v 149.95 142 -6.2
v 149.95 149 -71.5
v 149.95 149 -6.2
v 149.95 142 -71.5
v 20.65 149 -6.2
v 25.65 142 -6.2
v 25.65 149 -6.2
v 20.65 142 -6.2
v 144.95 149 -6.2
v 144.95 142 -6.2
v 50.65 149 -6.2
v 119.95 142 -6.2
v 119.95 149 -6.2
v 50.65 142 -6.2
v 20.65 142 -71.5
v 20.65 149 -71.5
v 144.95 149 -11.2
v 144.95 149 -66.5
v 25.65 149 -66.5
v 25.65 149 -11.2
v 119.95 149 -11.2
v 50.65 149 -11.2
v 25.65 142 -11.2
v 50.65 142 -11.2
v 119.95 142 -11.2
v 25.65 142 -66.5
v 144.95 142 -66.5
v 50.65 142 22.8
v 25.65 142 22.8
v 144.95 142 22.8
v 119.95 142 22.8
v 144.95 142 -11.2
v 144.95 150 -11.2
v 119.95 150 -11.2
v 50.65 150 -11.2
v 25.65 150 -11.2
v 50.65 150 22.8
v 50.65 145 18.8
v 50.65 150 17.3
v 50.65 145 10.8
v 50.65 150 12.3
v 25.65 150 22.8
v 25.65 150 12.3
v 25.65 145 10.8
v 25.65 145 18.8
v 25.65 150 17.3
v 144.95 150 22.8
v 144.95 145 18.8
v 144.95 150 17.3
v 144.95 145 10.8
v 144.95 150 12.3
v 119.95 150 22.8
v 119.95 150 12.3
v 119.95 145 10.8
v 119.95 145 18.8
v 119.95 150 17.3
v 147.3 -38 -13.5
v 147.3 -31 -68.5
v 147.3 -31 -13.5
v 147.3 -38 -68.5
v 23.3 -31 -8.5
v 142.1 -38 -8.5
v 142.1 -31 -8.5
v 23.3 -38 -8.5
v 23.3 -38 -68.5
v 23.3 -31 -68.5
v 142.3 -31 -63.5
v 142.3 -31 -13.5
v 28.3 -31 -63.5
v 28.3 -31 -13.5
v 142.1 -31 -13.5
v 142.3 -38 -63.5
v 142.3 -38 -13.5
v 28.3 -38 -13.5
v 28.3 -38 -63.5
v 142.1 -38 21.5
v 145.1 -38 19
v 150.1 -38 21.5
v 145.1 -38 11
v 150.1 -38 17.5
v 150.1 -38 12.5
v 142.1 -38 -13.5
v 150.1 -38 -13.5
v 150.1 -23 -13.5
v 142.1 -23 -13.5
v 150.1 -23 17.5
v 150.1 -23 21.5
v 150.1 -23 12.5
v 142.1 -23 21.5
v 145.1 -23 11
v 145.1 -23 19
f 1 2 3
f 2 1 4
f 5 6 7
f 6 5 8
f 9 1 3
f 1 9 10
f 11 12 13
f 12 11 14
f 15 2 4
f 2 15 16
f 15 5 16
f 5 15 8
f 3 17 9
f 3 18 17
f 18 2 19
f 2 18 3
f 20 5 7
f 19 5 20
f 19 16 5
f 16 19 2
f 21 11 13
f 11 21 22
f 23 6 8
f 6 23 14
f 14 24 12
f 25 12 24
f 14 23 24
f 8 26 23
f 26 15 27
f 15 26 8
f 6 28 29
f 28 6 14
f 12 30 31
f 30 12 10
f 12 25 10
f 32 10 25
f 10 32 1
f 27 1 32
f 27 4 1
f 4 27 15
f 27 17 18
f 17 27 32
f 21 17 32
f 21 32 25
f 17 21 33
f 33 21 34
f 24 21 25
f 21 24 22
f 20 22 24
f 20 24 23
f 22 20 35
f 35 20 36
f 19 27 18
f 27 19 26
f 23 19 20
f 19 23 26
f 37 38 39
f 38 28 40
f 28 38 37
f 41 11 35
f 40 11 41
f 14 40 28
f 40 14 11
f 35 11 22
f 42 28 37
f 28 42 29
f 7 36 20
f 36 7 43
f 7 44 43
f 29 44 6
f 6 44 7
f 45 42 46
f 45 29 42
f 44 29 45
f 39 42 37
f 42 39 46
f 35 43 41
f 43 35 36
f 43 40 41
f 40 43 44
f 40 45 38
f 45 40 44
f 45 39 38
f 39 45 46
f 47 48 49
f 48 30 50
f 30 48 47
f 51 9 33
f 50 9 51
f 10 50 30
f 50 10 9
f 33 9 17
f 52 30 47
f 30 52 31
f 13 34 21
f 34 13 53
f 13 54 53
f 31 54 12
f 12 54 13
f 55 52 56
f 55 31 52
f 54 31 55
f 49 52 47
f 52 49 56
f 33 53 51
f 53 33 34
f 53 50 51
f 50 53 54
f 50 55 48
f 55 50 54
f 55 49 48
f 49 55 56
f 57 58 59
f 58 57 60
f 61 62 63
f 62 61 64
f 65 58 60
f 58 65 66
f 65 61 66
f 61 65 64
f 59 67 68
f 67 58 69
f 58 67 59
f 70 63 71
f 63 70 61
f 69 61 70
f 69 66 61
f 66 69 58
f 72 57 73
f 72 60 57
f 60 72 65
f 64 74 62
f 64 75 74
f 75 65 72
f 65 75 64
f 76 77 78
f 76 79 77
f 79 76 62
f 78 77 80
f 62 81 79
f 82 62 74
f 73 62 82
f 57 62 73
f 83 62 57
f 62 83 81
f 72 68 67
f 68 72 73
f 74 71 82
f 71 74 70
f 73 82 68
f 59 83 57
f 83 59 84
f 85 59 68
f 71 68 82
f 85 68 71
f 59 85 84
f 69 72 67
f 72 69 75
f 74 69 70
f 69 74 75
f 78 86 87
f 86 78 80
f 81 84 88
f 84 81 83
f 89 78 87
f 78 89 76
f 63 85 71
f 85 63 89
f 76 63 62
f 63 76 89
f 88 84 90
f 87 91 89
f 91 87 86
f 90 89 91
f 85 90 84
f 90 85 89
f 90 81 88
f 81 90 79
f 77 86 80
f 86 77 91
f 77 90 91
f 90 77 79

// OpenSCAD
// file: long_bow_tie.scad
tilt_level = 1.1;

include <include.scad>;
include <globals.scad>;

obj_leg = 12;

function scale_x() = 1;
function scale_z() = (male_dove_depth-0.2)/male_dove_depth;

length = 50;

module bow_tie_master(length){
	union(){
		mirror([0,1,0])	dovetail_3d(male_dove_max_width, male_dove_min_width, male_dove_depth, length);
		dovetail_3d(male_dove_max_width, male_dove_min_width, male_dove_depth, length);
	}
}

module long_bow_tie_unscaled(length) {

    module endcyl() {
        translate([0,0,-3]) cylinder(d=24, h=6, $fn=60);
    }

    module endtub() {
        rotate([0,90,0]) translate([0,0,-15/2]) difference() {
            cylinder(d=20, h=15, $fn=60);
            cylinder(d=12, h=16, $fn=60);
            translate([-20,0,-0.1]) cube([40,20,16]);
        }
    }

    translate([0,0,male_dove_depth]) difference() {
        intersection(){
            rotate([90,0,0]) bow_tie_master(length);
            rotate([90,0,0]) cylinder(r=5.8, h=200);
        }
        translate([13,5,0]) rotate([90,0,25]) endcyl();
        translate([-13,5,0]) rotate([90,0,-25]) endcyl();
        translate([13,-length-5,0]) rotate([90,0,-25]) endcyl();
        translate([-13,-length-5,0]) rotate([90,0,25]) endcyl();

        translate([0,-length+4.5,0]) endtub();
        translate([0,-4.5,0]) rotate([180,0,0]) endtub();
    }
}

module long_bow_tie(length=length, scale_x=scale_x(), scale_z=scale_z()) {
    scale([scale_x, 1, scale_z]) long_bow_tie_unscaled(length);
}

module split(length) {
    translate([0,0,-1]) linear_extrude(height=length+2) polygon(points=[[0,-1], [1,-1], [2.1,-5], [-2.1,-5], [-1,-1]]);
}

module long_bow_tie_split(length=length, scale_x=scale_x(), scale_z=scale_z()) {
    translate([0,0,scale_z*male_dove_depth]) rotate([90,0,0]) difference() {
        translate([0,-(scale_z*male_dove_depth),0]) rotate([-90,0,0]) long_bow_tie(length);
        split(length);
        rotate([0,0,180]) split();
    }
}

module long_bow_tie_half(length=length, scale_x=scale_x(), scale_z=scale_z()) {
    rotate([0,-90,0]) intersection() {
        long_bow_tie(length);
        translate([0,-length,-1]) cube([6, length, 12]);
    }
}

long_bow_tie();
//long_bow_tie(25);
//long_bow_tie_half(length);
//long_bow_tie_split(length);
// file: globals.scad
/*
Most things in this file is represented as one millimeter, so keep that in mind while changing things.
Some of the setting are not mm but at variables that you can set, such as 2*x=2x and you are setting what x is.
I will try to specify when things are variables and not exact measurements.
*/

// printer slop
slop = 0.15;

obj_leg = 30;
leg_length = 5.5;
small_number = 0.001;
metal_core_rode_global = 5;


///////////////// number of holes /////////////////////
z_hole_number = 8;
other_holes = 8;

///////////////// Pins /////////////////////

//pins that poke out
ball_size = 10;
pin_height = 20;
pin_diameter = 6;


//holes
hole_ball_size = ball_size;
hole_pin_height = pin_height;
hole_pin_diameter = pin_diameter;

///////////////// Z THINGS /////////////////////

berring_slot_width = 7.5;
berring_slot_depth = 6.5;
metal_core_rode = 5;

///////////////// X THINGS /////////////////////

//male dove tails
male_dove_max_width=8;
male_dove_min_width=5;
male_dove_depth=5;
male_dove_height=obj_leg/2;

function scaled_male_dove_max_width() = male_dove_max_width;
function scaled_male_dove_min_width() = male_dove_min_width - 0.5*slop;
function scaled_male_dove_depth() = male_dove_depth - .2;

//female dove tails, this is found on the y mounts
girl_max_width=11;
girl_min_width=5;
girl_depth=5;
girl_height=obj_leg;


///////////////// Y THINGS /////////////////////
/*
The Y is so normal that all of those global variables at the top should change all of the setting in it, this section is set her incase there are variables set in the future development of this project.
*/

// stepper
motor_side_length = 43.2;
motor_bolt_hole_distance = 31;
motor_center_hole = 23;
motor_shaft_dia = 5;
motor_shaft_hole_dia = 5;

// bolts etc.
bolt_hole_dia = 3+2*slop;
bolt_head_hole_dia = 6.2;

m4_bolt_hole_dia = 4+2*slop;
m4_bolt_head_hole_dia = 6.8+2*slop;

m3_nut_side = 5.65;
m3_nut_height = 2.3;
m4_nut_side = 6.85;
m4_nut_height = 3.1;

// threaded rod
lifter_rod_diam = 9.86;
hole_threaded_rod = lifter_rod_diam+2*slop;

// for the extensions
metal_rod_size = 9;

// z screw
z_screw_d = 25;

// stabilizer
pin_bolt_dia = 12-2*slop;
pin_bolt_dia_minus = 12+2*slop;

clip_bolt_dia = 10-2*slop;
clip_bolt_dia_minus = 10+2*slop;
// main file
include <globals.scad>;
include <include.scad>;

use <long_bow_tie.scad>;
use <mockups.scad>;

psu_height = 50;
psu_width = 114;

psu_cover_width = 119+2*slop;
psu_cover_height = 55+2*slop;

atx_psu_width = 150+2*slop;
atx_psu_height = 86+2*slop;

atx_psu_cover_width = atx_psu_width+4+2*slop;
atx_psu_cover_height = atx_psu_height+2+slop;

thickness = 7;

bolt_hole_down = 11.5;
bolt_hole_up = 13;

module mock_psu() {
    cube([psu_width, 220, psu_height]);
}

module mock_atx_psu(holes=true, slop=0) {
    w = atx_psu_width;
    h = atx_psu_height;

    color("grey") {
        if (holes) {
            minus_atx_psu_holes() {
                translate([-w/2,0.01,0]) cube([w, 140, h]);
            }
        } else {
            translate([-w/2,0,0]) cube([w, 140, h]);
        }
    }
}

module minus_atx_psu_holes(hole=3.2) {
    difference() {
        children();
        translate([-138/2,0,6]) rotate([-90,0,0]) cylinder(d=hole, h=5, $fn=30);
        translate([138/2,0,6]) rotate([-90,0,0]) cylinder(d=hole, h=5, $fn=30);
        translate([138/2,0,6+64]) rotate([-90,0,0]) cylinder(d=hole, h=5, $fn=30);
        translate([-150/2+30,0,atx_psu_height-6]) rotate([-90,0,0]) cylinder(d=hole, h=5, $fn=30);
    }
}

module _front(w, h, dove_pos=26) {
    difference() {
        cube([w+10, thickness, h+10], center=true);
        cube([w, thickness+1, h], center=true);
    }
    difference() {
        translate([-w/2, -thickness+thickness/2, h/2]) cube([25,8,dove_pos+8]);
        translate([-w/2+25,thickness/2+(8-thickness), h/2+dove_pos]) rotate([0,90,180]) male_dovetail(25);
    }
    difference() {
        translate([w/2-25,-thickness+thickness/2, h/2]) cube([25,8,dove_pos+8]);
        translate([w/2,thickness/2+(8-thickness), h/2+dove_pos]) rotate([0,90,180]) male_dovetail(26);
    }
}

module front() {
    _front(psu_cover_width, psu_cover_height);
}

module front_atx() {
    union() {
        difference() {
            _front(atx_psu_cover_width, atx_psu_cover_height, 18);
            translate([0,10/2-2,-atx_psu_cover_height/2-1]) cube([atx_psu_cover_width,10,10],center=true);
        }
    }
}

module _back(w,h) {
    difference() {
        cube([w+10, thickness, h+10], center=true);
        cube([w, thickness+1, h], center=true);
    }
}

module back() {
    union() {
        _back(psu_width, psu_height);
        difference() {
            translate([psu_width/2-0.5+2*slop,-thickness/2,psu_height/2]) cube([8,15,35]);
            translate([psu_width/2+7.5+2*slop,-thickness/2-1,psu_height/2+28.5]) rotate([0,90,90]) male_dovetail(17);
        }
    }
}

module back_atx() {
    union() {
        difference() {
            _back(atx_psu_width, atx_psu_height);
            translate([0,10/2-2,-atx_psu_height/2-1]) cube([atx_psu_width,10,10],center=true);
        }
        difference() {
            translate([atx_psu_width/2-0.5+2*slop,-thickness/2,atx_psu_height/2]) cube([8,15,27]);
            translate([atx_psu_width/2+7.5+2*slop,-thickness/2-1,atx_psu_height/2+18]) rotate([0,90,90]) male_dovetail(17);
        }
    }
}

// unused
module clip() {
    c_len = 20;
    rotate([-90,0,0]) difference() {
        union() { 
            translate([0,0,-scaled_male_dove_depth()]) long_bow_tie_split(c_len);
            translate([11,0,-5-scaled_male_dove_depth()]) long_bow_tie_split(c_len);
            translate([-2.5,-c_len,-scaled_male_dove_depth()]) cube([16,c_len,scaled_male_dove_depth()]);
            translate([8.9,-c_len,-scaled_male_dove_depth()-5]) cube([3,c_len,scaled_male_dove_depth()]);
        }
        translate([11-slop,-c_len-1,-10]) cube([5,c_len+2,11]);
    }
}

module atx_psu_cover() {
    l = 45;
    nob_y = l/2-3;

    minus_atx_psu_holes(3.7) {
        translate([0,45/2+0.01,atx_psu_cover_height/2]) difference() {
            union() {
                cube([atx_psu_cover_width, l,atx_psu_cover_height],center=true);
                translate([-atx_psu_cover_width/2,nob_y,5]) sphere(d=3,$fn=20);
                translate([-atx_psu_cover_width/2,nob_y,-5]) sphere(d=3,$fn=20);
                translate([-atx_psu_cover_width/2,nob_y-thickness-2,5]) sphere(d=3,$fn=20);
                translate([-atx_psu_cover_width/2,nob_y-thickness-2,-5]) sphere(d=3,$fn=20);

                translate([atx_psu_cover_width/2,nob_y,5]) sphere(d=3,$fn=20);
                translate([atx_psu_cover_width/2,nob_y,-5]) sphere(d=3,$fn=20);
                translate([atx_psu_cover_width/2,nob_y-thickness-2,5]) sphere(d=3,$fn=20);
                translate([atx_psu_cover_width/2,nob_y-thickness-2,-5]) sphere(d=3,$fn=20);

            }
            translate([0,2,0]) cube([atx_psu_width, l,atx_psu_cover_height+1],center=true);
            translate([-atx_psu_cover_width,-15,atx_psu_cover_height/2]) rotate([-45,0,0]) cube([atx_psu_cover_width*2,60,60]);
            translate([-atx_psu_cover_width,-15,-atx_psu_cover_height/2]) rotate([-45,0,0]) cube([atx_psu_cover_width*2,60,60]);

            translate([-11/2+1,-0.01,-1]) cube([atx_psu_width-11,l,atx_psu_cover_height-20],center=true);
            translate([1,-0.01,-6]) cube([atx_psu_width-4,l,atx_psu_cover_height-32],center=true);
            translate([0,-0.01,-13]) cube([atx_psu_width-20,l,atx_psu_cover_height-32],center=true);
            translate([12,-0.01,13]) cube([atx_psu_width-44,l,atx_psu_cover_height-32],center=true);
        }
    }
}

module view_proper() {
    translate([psu_width/2+28+2*slop,300/2-(thickness/2+(8-thickness)),psu_cover_height/2-66.5]) front();
    translate([psu_width/2+28+2*slop,-30-(thickness/2+(8-thickness)),psu_height/2-63.5]) back();

    frame_mockup(bed_angle=0, units_x=2, units_y=2, units_z=2);
    %translate([28+2*slop, -60, -63.5 ]) mock_psu();
}

module view_proper_atx() {
    translate([atx_psu_width/2-8,300/2-(thickness/2+(8-thickness)),atx_psu_height/2-90.5]) front_atx();
    translate([atx_psu_width/2-8,60-(thickness/2+(8-thickness)),atx_psu_height/2-89.5]) back_atx();

    frame_mockup(bed_angle=0, units_x=2, units_y=2, units_z=2);
    translate([-8+atx_psu_width/2, 180, -89.5 ]) rotate([0,0,180]) mock_atx_psu();
    translate([-8+atx_psu_width/2, 183, -89.5 ]) rotate([0,0,180]) atx_psu_cover();
}

module psu_clips() {
    translate([0,psu_cover_height,0]) rotate([90,0,0]) front(psu_cover_width, psu_cover_height);
    translate([0,-psu_height/2-17,0]) rotate([90,0,0]) back(psu_width,psu_height);
}

module psu_clips_atx() {
    translate([0,psu_cover_height,0]) rotate([90,0,0]) front_atx();
    translate([0,-psu_height/2-17,0]) rotate([90,0,0]) back_atx();
}

module clip_extension() {
    rotate([0,10,0]) difference() {
        intersection() {
            rotate([0,-10,0]) cube([46,25,15]);
            cube([42,30,25]);
        }
        translate([0,25-15,0]) rotate([0,0,-90]) male_dovetail(25);
        translate([42,25-15,0]) rotate([0,0,90]) male_dovetail(25);
    }
}

view_proper();
//view_proper_atx();
//psu_clips();
//clip();
 //psu_clips_atx();
//rotate([90,0,0]) atx_psu_cover();
//rotate([90,0,0]) front_atx();
//rotate([90,0,0]) back_atx();
//clip_extension();
